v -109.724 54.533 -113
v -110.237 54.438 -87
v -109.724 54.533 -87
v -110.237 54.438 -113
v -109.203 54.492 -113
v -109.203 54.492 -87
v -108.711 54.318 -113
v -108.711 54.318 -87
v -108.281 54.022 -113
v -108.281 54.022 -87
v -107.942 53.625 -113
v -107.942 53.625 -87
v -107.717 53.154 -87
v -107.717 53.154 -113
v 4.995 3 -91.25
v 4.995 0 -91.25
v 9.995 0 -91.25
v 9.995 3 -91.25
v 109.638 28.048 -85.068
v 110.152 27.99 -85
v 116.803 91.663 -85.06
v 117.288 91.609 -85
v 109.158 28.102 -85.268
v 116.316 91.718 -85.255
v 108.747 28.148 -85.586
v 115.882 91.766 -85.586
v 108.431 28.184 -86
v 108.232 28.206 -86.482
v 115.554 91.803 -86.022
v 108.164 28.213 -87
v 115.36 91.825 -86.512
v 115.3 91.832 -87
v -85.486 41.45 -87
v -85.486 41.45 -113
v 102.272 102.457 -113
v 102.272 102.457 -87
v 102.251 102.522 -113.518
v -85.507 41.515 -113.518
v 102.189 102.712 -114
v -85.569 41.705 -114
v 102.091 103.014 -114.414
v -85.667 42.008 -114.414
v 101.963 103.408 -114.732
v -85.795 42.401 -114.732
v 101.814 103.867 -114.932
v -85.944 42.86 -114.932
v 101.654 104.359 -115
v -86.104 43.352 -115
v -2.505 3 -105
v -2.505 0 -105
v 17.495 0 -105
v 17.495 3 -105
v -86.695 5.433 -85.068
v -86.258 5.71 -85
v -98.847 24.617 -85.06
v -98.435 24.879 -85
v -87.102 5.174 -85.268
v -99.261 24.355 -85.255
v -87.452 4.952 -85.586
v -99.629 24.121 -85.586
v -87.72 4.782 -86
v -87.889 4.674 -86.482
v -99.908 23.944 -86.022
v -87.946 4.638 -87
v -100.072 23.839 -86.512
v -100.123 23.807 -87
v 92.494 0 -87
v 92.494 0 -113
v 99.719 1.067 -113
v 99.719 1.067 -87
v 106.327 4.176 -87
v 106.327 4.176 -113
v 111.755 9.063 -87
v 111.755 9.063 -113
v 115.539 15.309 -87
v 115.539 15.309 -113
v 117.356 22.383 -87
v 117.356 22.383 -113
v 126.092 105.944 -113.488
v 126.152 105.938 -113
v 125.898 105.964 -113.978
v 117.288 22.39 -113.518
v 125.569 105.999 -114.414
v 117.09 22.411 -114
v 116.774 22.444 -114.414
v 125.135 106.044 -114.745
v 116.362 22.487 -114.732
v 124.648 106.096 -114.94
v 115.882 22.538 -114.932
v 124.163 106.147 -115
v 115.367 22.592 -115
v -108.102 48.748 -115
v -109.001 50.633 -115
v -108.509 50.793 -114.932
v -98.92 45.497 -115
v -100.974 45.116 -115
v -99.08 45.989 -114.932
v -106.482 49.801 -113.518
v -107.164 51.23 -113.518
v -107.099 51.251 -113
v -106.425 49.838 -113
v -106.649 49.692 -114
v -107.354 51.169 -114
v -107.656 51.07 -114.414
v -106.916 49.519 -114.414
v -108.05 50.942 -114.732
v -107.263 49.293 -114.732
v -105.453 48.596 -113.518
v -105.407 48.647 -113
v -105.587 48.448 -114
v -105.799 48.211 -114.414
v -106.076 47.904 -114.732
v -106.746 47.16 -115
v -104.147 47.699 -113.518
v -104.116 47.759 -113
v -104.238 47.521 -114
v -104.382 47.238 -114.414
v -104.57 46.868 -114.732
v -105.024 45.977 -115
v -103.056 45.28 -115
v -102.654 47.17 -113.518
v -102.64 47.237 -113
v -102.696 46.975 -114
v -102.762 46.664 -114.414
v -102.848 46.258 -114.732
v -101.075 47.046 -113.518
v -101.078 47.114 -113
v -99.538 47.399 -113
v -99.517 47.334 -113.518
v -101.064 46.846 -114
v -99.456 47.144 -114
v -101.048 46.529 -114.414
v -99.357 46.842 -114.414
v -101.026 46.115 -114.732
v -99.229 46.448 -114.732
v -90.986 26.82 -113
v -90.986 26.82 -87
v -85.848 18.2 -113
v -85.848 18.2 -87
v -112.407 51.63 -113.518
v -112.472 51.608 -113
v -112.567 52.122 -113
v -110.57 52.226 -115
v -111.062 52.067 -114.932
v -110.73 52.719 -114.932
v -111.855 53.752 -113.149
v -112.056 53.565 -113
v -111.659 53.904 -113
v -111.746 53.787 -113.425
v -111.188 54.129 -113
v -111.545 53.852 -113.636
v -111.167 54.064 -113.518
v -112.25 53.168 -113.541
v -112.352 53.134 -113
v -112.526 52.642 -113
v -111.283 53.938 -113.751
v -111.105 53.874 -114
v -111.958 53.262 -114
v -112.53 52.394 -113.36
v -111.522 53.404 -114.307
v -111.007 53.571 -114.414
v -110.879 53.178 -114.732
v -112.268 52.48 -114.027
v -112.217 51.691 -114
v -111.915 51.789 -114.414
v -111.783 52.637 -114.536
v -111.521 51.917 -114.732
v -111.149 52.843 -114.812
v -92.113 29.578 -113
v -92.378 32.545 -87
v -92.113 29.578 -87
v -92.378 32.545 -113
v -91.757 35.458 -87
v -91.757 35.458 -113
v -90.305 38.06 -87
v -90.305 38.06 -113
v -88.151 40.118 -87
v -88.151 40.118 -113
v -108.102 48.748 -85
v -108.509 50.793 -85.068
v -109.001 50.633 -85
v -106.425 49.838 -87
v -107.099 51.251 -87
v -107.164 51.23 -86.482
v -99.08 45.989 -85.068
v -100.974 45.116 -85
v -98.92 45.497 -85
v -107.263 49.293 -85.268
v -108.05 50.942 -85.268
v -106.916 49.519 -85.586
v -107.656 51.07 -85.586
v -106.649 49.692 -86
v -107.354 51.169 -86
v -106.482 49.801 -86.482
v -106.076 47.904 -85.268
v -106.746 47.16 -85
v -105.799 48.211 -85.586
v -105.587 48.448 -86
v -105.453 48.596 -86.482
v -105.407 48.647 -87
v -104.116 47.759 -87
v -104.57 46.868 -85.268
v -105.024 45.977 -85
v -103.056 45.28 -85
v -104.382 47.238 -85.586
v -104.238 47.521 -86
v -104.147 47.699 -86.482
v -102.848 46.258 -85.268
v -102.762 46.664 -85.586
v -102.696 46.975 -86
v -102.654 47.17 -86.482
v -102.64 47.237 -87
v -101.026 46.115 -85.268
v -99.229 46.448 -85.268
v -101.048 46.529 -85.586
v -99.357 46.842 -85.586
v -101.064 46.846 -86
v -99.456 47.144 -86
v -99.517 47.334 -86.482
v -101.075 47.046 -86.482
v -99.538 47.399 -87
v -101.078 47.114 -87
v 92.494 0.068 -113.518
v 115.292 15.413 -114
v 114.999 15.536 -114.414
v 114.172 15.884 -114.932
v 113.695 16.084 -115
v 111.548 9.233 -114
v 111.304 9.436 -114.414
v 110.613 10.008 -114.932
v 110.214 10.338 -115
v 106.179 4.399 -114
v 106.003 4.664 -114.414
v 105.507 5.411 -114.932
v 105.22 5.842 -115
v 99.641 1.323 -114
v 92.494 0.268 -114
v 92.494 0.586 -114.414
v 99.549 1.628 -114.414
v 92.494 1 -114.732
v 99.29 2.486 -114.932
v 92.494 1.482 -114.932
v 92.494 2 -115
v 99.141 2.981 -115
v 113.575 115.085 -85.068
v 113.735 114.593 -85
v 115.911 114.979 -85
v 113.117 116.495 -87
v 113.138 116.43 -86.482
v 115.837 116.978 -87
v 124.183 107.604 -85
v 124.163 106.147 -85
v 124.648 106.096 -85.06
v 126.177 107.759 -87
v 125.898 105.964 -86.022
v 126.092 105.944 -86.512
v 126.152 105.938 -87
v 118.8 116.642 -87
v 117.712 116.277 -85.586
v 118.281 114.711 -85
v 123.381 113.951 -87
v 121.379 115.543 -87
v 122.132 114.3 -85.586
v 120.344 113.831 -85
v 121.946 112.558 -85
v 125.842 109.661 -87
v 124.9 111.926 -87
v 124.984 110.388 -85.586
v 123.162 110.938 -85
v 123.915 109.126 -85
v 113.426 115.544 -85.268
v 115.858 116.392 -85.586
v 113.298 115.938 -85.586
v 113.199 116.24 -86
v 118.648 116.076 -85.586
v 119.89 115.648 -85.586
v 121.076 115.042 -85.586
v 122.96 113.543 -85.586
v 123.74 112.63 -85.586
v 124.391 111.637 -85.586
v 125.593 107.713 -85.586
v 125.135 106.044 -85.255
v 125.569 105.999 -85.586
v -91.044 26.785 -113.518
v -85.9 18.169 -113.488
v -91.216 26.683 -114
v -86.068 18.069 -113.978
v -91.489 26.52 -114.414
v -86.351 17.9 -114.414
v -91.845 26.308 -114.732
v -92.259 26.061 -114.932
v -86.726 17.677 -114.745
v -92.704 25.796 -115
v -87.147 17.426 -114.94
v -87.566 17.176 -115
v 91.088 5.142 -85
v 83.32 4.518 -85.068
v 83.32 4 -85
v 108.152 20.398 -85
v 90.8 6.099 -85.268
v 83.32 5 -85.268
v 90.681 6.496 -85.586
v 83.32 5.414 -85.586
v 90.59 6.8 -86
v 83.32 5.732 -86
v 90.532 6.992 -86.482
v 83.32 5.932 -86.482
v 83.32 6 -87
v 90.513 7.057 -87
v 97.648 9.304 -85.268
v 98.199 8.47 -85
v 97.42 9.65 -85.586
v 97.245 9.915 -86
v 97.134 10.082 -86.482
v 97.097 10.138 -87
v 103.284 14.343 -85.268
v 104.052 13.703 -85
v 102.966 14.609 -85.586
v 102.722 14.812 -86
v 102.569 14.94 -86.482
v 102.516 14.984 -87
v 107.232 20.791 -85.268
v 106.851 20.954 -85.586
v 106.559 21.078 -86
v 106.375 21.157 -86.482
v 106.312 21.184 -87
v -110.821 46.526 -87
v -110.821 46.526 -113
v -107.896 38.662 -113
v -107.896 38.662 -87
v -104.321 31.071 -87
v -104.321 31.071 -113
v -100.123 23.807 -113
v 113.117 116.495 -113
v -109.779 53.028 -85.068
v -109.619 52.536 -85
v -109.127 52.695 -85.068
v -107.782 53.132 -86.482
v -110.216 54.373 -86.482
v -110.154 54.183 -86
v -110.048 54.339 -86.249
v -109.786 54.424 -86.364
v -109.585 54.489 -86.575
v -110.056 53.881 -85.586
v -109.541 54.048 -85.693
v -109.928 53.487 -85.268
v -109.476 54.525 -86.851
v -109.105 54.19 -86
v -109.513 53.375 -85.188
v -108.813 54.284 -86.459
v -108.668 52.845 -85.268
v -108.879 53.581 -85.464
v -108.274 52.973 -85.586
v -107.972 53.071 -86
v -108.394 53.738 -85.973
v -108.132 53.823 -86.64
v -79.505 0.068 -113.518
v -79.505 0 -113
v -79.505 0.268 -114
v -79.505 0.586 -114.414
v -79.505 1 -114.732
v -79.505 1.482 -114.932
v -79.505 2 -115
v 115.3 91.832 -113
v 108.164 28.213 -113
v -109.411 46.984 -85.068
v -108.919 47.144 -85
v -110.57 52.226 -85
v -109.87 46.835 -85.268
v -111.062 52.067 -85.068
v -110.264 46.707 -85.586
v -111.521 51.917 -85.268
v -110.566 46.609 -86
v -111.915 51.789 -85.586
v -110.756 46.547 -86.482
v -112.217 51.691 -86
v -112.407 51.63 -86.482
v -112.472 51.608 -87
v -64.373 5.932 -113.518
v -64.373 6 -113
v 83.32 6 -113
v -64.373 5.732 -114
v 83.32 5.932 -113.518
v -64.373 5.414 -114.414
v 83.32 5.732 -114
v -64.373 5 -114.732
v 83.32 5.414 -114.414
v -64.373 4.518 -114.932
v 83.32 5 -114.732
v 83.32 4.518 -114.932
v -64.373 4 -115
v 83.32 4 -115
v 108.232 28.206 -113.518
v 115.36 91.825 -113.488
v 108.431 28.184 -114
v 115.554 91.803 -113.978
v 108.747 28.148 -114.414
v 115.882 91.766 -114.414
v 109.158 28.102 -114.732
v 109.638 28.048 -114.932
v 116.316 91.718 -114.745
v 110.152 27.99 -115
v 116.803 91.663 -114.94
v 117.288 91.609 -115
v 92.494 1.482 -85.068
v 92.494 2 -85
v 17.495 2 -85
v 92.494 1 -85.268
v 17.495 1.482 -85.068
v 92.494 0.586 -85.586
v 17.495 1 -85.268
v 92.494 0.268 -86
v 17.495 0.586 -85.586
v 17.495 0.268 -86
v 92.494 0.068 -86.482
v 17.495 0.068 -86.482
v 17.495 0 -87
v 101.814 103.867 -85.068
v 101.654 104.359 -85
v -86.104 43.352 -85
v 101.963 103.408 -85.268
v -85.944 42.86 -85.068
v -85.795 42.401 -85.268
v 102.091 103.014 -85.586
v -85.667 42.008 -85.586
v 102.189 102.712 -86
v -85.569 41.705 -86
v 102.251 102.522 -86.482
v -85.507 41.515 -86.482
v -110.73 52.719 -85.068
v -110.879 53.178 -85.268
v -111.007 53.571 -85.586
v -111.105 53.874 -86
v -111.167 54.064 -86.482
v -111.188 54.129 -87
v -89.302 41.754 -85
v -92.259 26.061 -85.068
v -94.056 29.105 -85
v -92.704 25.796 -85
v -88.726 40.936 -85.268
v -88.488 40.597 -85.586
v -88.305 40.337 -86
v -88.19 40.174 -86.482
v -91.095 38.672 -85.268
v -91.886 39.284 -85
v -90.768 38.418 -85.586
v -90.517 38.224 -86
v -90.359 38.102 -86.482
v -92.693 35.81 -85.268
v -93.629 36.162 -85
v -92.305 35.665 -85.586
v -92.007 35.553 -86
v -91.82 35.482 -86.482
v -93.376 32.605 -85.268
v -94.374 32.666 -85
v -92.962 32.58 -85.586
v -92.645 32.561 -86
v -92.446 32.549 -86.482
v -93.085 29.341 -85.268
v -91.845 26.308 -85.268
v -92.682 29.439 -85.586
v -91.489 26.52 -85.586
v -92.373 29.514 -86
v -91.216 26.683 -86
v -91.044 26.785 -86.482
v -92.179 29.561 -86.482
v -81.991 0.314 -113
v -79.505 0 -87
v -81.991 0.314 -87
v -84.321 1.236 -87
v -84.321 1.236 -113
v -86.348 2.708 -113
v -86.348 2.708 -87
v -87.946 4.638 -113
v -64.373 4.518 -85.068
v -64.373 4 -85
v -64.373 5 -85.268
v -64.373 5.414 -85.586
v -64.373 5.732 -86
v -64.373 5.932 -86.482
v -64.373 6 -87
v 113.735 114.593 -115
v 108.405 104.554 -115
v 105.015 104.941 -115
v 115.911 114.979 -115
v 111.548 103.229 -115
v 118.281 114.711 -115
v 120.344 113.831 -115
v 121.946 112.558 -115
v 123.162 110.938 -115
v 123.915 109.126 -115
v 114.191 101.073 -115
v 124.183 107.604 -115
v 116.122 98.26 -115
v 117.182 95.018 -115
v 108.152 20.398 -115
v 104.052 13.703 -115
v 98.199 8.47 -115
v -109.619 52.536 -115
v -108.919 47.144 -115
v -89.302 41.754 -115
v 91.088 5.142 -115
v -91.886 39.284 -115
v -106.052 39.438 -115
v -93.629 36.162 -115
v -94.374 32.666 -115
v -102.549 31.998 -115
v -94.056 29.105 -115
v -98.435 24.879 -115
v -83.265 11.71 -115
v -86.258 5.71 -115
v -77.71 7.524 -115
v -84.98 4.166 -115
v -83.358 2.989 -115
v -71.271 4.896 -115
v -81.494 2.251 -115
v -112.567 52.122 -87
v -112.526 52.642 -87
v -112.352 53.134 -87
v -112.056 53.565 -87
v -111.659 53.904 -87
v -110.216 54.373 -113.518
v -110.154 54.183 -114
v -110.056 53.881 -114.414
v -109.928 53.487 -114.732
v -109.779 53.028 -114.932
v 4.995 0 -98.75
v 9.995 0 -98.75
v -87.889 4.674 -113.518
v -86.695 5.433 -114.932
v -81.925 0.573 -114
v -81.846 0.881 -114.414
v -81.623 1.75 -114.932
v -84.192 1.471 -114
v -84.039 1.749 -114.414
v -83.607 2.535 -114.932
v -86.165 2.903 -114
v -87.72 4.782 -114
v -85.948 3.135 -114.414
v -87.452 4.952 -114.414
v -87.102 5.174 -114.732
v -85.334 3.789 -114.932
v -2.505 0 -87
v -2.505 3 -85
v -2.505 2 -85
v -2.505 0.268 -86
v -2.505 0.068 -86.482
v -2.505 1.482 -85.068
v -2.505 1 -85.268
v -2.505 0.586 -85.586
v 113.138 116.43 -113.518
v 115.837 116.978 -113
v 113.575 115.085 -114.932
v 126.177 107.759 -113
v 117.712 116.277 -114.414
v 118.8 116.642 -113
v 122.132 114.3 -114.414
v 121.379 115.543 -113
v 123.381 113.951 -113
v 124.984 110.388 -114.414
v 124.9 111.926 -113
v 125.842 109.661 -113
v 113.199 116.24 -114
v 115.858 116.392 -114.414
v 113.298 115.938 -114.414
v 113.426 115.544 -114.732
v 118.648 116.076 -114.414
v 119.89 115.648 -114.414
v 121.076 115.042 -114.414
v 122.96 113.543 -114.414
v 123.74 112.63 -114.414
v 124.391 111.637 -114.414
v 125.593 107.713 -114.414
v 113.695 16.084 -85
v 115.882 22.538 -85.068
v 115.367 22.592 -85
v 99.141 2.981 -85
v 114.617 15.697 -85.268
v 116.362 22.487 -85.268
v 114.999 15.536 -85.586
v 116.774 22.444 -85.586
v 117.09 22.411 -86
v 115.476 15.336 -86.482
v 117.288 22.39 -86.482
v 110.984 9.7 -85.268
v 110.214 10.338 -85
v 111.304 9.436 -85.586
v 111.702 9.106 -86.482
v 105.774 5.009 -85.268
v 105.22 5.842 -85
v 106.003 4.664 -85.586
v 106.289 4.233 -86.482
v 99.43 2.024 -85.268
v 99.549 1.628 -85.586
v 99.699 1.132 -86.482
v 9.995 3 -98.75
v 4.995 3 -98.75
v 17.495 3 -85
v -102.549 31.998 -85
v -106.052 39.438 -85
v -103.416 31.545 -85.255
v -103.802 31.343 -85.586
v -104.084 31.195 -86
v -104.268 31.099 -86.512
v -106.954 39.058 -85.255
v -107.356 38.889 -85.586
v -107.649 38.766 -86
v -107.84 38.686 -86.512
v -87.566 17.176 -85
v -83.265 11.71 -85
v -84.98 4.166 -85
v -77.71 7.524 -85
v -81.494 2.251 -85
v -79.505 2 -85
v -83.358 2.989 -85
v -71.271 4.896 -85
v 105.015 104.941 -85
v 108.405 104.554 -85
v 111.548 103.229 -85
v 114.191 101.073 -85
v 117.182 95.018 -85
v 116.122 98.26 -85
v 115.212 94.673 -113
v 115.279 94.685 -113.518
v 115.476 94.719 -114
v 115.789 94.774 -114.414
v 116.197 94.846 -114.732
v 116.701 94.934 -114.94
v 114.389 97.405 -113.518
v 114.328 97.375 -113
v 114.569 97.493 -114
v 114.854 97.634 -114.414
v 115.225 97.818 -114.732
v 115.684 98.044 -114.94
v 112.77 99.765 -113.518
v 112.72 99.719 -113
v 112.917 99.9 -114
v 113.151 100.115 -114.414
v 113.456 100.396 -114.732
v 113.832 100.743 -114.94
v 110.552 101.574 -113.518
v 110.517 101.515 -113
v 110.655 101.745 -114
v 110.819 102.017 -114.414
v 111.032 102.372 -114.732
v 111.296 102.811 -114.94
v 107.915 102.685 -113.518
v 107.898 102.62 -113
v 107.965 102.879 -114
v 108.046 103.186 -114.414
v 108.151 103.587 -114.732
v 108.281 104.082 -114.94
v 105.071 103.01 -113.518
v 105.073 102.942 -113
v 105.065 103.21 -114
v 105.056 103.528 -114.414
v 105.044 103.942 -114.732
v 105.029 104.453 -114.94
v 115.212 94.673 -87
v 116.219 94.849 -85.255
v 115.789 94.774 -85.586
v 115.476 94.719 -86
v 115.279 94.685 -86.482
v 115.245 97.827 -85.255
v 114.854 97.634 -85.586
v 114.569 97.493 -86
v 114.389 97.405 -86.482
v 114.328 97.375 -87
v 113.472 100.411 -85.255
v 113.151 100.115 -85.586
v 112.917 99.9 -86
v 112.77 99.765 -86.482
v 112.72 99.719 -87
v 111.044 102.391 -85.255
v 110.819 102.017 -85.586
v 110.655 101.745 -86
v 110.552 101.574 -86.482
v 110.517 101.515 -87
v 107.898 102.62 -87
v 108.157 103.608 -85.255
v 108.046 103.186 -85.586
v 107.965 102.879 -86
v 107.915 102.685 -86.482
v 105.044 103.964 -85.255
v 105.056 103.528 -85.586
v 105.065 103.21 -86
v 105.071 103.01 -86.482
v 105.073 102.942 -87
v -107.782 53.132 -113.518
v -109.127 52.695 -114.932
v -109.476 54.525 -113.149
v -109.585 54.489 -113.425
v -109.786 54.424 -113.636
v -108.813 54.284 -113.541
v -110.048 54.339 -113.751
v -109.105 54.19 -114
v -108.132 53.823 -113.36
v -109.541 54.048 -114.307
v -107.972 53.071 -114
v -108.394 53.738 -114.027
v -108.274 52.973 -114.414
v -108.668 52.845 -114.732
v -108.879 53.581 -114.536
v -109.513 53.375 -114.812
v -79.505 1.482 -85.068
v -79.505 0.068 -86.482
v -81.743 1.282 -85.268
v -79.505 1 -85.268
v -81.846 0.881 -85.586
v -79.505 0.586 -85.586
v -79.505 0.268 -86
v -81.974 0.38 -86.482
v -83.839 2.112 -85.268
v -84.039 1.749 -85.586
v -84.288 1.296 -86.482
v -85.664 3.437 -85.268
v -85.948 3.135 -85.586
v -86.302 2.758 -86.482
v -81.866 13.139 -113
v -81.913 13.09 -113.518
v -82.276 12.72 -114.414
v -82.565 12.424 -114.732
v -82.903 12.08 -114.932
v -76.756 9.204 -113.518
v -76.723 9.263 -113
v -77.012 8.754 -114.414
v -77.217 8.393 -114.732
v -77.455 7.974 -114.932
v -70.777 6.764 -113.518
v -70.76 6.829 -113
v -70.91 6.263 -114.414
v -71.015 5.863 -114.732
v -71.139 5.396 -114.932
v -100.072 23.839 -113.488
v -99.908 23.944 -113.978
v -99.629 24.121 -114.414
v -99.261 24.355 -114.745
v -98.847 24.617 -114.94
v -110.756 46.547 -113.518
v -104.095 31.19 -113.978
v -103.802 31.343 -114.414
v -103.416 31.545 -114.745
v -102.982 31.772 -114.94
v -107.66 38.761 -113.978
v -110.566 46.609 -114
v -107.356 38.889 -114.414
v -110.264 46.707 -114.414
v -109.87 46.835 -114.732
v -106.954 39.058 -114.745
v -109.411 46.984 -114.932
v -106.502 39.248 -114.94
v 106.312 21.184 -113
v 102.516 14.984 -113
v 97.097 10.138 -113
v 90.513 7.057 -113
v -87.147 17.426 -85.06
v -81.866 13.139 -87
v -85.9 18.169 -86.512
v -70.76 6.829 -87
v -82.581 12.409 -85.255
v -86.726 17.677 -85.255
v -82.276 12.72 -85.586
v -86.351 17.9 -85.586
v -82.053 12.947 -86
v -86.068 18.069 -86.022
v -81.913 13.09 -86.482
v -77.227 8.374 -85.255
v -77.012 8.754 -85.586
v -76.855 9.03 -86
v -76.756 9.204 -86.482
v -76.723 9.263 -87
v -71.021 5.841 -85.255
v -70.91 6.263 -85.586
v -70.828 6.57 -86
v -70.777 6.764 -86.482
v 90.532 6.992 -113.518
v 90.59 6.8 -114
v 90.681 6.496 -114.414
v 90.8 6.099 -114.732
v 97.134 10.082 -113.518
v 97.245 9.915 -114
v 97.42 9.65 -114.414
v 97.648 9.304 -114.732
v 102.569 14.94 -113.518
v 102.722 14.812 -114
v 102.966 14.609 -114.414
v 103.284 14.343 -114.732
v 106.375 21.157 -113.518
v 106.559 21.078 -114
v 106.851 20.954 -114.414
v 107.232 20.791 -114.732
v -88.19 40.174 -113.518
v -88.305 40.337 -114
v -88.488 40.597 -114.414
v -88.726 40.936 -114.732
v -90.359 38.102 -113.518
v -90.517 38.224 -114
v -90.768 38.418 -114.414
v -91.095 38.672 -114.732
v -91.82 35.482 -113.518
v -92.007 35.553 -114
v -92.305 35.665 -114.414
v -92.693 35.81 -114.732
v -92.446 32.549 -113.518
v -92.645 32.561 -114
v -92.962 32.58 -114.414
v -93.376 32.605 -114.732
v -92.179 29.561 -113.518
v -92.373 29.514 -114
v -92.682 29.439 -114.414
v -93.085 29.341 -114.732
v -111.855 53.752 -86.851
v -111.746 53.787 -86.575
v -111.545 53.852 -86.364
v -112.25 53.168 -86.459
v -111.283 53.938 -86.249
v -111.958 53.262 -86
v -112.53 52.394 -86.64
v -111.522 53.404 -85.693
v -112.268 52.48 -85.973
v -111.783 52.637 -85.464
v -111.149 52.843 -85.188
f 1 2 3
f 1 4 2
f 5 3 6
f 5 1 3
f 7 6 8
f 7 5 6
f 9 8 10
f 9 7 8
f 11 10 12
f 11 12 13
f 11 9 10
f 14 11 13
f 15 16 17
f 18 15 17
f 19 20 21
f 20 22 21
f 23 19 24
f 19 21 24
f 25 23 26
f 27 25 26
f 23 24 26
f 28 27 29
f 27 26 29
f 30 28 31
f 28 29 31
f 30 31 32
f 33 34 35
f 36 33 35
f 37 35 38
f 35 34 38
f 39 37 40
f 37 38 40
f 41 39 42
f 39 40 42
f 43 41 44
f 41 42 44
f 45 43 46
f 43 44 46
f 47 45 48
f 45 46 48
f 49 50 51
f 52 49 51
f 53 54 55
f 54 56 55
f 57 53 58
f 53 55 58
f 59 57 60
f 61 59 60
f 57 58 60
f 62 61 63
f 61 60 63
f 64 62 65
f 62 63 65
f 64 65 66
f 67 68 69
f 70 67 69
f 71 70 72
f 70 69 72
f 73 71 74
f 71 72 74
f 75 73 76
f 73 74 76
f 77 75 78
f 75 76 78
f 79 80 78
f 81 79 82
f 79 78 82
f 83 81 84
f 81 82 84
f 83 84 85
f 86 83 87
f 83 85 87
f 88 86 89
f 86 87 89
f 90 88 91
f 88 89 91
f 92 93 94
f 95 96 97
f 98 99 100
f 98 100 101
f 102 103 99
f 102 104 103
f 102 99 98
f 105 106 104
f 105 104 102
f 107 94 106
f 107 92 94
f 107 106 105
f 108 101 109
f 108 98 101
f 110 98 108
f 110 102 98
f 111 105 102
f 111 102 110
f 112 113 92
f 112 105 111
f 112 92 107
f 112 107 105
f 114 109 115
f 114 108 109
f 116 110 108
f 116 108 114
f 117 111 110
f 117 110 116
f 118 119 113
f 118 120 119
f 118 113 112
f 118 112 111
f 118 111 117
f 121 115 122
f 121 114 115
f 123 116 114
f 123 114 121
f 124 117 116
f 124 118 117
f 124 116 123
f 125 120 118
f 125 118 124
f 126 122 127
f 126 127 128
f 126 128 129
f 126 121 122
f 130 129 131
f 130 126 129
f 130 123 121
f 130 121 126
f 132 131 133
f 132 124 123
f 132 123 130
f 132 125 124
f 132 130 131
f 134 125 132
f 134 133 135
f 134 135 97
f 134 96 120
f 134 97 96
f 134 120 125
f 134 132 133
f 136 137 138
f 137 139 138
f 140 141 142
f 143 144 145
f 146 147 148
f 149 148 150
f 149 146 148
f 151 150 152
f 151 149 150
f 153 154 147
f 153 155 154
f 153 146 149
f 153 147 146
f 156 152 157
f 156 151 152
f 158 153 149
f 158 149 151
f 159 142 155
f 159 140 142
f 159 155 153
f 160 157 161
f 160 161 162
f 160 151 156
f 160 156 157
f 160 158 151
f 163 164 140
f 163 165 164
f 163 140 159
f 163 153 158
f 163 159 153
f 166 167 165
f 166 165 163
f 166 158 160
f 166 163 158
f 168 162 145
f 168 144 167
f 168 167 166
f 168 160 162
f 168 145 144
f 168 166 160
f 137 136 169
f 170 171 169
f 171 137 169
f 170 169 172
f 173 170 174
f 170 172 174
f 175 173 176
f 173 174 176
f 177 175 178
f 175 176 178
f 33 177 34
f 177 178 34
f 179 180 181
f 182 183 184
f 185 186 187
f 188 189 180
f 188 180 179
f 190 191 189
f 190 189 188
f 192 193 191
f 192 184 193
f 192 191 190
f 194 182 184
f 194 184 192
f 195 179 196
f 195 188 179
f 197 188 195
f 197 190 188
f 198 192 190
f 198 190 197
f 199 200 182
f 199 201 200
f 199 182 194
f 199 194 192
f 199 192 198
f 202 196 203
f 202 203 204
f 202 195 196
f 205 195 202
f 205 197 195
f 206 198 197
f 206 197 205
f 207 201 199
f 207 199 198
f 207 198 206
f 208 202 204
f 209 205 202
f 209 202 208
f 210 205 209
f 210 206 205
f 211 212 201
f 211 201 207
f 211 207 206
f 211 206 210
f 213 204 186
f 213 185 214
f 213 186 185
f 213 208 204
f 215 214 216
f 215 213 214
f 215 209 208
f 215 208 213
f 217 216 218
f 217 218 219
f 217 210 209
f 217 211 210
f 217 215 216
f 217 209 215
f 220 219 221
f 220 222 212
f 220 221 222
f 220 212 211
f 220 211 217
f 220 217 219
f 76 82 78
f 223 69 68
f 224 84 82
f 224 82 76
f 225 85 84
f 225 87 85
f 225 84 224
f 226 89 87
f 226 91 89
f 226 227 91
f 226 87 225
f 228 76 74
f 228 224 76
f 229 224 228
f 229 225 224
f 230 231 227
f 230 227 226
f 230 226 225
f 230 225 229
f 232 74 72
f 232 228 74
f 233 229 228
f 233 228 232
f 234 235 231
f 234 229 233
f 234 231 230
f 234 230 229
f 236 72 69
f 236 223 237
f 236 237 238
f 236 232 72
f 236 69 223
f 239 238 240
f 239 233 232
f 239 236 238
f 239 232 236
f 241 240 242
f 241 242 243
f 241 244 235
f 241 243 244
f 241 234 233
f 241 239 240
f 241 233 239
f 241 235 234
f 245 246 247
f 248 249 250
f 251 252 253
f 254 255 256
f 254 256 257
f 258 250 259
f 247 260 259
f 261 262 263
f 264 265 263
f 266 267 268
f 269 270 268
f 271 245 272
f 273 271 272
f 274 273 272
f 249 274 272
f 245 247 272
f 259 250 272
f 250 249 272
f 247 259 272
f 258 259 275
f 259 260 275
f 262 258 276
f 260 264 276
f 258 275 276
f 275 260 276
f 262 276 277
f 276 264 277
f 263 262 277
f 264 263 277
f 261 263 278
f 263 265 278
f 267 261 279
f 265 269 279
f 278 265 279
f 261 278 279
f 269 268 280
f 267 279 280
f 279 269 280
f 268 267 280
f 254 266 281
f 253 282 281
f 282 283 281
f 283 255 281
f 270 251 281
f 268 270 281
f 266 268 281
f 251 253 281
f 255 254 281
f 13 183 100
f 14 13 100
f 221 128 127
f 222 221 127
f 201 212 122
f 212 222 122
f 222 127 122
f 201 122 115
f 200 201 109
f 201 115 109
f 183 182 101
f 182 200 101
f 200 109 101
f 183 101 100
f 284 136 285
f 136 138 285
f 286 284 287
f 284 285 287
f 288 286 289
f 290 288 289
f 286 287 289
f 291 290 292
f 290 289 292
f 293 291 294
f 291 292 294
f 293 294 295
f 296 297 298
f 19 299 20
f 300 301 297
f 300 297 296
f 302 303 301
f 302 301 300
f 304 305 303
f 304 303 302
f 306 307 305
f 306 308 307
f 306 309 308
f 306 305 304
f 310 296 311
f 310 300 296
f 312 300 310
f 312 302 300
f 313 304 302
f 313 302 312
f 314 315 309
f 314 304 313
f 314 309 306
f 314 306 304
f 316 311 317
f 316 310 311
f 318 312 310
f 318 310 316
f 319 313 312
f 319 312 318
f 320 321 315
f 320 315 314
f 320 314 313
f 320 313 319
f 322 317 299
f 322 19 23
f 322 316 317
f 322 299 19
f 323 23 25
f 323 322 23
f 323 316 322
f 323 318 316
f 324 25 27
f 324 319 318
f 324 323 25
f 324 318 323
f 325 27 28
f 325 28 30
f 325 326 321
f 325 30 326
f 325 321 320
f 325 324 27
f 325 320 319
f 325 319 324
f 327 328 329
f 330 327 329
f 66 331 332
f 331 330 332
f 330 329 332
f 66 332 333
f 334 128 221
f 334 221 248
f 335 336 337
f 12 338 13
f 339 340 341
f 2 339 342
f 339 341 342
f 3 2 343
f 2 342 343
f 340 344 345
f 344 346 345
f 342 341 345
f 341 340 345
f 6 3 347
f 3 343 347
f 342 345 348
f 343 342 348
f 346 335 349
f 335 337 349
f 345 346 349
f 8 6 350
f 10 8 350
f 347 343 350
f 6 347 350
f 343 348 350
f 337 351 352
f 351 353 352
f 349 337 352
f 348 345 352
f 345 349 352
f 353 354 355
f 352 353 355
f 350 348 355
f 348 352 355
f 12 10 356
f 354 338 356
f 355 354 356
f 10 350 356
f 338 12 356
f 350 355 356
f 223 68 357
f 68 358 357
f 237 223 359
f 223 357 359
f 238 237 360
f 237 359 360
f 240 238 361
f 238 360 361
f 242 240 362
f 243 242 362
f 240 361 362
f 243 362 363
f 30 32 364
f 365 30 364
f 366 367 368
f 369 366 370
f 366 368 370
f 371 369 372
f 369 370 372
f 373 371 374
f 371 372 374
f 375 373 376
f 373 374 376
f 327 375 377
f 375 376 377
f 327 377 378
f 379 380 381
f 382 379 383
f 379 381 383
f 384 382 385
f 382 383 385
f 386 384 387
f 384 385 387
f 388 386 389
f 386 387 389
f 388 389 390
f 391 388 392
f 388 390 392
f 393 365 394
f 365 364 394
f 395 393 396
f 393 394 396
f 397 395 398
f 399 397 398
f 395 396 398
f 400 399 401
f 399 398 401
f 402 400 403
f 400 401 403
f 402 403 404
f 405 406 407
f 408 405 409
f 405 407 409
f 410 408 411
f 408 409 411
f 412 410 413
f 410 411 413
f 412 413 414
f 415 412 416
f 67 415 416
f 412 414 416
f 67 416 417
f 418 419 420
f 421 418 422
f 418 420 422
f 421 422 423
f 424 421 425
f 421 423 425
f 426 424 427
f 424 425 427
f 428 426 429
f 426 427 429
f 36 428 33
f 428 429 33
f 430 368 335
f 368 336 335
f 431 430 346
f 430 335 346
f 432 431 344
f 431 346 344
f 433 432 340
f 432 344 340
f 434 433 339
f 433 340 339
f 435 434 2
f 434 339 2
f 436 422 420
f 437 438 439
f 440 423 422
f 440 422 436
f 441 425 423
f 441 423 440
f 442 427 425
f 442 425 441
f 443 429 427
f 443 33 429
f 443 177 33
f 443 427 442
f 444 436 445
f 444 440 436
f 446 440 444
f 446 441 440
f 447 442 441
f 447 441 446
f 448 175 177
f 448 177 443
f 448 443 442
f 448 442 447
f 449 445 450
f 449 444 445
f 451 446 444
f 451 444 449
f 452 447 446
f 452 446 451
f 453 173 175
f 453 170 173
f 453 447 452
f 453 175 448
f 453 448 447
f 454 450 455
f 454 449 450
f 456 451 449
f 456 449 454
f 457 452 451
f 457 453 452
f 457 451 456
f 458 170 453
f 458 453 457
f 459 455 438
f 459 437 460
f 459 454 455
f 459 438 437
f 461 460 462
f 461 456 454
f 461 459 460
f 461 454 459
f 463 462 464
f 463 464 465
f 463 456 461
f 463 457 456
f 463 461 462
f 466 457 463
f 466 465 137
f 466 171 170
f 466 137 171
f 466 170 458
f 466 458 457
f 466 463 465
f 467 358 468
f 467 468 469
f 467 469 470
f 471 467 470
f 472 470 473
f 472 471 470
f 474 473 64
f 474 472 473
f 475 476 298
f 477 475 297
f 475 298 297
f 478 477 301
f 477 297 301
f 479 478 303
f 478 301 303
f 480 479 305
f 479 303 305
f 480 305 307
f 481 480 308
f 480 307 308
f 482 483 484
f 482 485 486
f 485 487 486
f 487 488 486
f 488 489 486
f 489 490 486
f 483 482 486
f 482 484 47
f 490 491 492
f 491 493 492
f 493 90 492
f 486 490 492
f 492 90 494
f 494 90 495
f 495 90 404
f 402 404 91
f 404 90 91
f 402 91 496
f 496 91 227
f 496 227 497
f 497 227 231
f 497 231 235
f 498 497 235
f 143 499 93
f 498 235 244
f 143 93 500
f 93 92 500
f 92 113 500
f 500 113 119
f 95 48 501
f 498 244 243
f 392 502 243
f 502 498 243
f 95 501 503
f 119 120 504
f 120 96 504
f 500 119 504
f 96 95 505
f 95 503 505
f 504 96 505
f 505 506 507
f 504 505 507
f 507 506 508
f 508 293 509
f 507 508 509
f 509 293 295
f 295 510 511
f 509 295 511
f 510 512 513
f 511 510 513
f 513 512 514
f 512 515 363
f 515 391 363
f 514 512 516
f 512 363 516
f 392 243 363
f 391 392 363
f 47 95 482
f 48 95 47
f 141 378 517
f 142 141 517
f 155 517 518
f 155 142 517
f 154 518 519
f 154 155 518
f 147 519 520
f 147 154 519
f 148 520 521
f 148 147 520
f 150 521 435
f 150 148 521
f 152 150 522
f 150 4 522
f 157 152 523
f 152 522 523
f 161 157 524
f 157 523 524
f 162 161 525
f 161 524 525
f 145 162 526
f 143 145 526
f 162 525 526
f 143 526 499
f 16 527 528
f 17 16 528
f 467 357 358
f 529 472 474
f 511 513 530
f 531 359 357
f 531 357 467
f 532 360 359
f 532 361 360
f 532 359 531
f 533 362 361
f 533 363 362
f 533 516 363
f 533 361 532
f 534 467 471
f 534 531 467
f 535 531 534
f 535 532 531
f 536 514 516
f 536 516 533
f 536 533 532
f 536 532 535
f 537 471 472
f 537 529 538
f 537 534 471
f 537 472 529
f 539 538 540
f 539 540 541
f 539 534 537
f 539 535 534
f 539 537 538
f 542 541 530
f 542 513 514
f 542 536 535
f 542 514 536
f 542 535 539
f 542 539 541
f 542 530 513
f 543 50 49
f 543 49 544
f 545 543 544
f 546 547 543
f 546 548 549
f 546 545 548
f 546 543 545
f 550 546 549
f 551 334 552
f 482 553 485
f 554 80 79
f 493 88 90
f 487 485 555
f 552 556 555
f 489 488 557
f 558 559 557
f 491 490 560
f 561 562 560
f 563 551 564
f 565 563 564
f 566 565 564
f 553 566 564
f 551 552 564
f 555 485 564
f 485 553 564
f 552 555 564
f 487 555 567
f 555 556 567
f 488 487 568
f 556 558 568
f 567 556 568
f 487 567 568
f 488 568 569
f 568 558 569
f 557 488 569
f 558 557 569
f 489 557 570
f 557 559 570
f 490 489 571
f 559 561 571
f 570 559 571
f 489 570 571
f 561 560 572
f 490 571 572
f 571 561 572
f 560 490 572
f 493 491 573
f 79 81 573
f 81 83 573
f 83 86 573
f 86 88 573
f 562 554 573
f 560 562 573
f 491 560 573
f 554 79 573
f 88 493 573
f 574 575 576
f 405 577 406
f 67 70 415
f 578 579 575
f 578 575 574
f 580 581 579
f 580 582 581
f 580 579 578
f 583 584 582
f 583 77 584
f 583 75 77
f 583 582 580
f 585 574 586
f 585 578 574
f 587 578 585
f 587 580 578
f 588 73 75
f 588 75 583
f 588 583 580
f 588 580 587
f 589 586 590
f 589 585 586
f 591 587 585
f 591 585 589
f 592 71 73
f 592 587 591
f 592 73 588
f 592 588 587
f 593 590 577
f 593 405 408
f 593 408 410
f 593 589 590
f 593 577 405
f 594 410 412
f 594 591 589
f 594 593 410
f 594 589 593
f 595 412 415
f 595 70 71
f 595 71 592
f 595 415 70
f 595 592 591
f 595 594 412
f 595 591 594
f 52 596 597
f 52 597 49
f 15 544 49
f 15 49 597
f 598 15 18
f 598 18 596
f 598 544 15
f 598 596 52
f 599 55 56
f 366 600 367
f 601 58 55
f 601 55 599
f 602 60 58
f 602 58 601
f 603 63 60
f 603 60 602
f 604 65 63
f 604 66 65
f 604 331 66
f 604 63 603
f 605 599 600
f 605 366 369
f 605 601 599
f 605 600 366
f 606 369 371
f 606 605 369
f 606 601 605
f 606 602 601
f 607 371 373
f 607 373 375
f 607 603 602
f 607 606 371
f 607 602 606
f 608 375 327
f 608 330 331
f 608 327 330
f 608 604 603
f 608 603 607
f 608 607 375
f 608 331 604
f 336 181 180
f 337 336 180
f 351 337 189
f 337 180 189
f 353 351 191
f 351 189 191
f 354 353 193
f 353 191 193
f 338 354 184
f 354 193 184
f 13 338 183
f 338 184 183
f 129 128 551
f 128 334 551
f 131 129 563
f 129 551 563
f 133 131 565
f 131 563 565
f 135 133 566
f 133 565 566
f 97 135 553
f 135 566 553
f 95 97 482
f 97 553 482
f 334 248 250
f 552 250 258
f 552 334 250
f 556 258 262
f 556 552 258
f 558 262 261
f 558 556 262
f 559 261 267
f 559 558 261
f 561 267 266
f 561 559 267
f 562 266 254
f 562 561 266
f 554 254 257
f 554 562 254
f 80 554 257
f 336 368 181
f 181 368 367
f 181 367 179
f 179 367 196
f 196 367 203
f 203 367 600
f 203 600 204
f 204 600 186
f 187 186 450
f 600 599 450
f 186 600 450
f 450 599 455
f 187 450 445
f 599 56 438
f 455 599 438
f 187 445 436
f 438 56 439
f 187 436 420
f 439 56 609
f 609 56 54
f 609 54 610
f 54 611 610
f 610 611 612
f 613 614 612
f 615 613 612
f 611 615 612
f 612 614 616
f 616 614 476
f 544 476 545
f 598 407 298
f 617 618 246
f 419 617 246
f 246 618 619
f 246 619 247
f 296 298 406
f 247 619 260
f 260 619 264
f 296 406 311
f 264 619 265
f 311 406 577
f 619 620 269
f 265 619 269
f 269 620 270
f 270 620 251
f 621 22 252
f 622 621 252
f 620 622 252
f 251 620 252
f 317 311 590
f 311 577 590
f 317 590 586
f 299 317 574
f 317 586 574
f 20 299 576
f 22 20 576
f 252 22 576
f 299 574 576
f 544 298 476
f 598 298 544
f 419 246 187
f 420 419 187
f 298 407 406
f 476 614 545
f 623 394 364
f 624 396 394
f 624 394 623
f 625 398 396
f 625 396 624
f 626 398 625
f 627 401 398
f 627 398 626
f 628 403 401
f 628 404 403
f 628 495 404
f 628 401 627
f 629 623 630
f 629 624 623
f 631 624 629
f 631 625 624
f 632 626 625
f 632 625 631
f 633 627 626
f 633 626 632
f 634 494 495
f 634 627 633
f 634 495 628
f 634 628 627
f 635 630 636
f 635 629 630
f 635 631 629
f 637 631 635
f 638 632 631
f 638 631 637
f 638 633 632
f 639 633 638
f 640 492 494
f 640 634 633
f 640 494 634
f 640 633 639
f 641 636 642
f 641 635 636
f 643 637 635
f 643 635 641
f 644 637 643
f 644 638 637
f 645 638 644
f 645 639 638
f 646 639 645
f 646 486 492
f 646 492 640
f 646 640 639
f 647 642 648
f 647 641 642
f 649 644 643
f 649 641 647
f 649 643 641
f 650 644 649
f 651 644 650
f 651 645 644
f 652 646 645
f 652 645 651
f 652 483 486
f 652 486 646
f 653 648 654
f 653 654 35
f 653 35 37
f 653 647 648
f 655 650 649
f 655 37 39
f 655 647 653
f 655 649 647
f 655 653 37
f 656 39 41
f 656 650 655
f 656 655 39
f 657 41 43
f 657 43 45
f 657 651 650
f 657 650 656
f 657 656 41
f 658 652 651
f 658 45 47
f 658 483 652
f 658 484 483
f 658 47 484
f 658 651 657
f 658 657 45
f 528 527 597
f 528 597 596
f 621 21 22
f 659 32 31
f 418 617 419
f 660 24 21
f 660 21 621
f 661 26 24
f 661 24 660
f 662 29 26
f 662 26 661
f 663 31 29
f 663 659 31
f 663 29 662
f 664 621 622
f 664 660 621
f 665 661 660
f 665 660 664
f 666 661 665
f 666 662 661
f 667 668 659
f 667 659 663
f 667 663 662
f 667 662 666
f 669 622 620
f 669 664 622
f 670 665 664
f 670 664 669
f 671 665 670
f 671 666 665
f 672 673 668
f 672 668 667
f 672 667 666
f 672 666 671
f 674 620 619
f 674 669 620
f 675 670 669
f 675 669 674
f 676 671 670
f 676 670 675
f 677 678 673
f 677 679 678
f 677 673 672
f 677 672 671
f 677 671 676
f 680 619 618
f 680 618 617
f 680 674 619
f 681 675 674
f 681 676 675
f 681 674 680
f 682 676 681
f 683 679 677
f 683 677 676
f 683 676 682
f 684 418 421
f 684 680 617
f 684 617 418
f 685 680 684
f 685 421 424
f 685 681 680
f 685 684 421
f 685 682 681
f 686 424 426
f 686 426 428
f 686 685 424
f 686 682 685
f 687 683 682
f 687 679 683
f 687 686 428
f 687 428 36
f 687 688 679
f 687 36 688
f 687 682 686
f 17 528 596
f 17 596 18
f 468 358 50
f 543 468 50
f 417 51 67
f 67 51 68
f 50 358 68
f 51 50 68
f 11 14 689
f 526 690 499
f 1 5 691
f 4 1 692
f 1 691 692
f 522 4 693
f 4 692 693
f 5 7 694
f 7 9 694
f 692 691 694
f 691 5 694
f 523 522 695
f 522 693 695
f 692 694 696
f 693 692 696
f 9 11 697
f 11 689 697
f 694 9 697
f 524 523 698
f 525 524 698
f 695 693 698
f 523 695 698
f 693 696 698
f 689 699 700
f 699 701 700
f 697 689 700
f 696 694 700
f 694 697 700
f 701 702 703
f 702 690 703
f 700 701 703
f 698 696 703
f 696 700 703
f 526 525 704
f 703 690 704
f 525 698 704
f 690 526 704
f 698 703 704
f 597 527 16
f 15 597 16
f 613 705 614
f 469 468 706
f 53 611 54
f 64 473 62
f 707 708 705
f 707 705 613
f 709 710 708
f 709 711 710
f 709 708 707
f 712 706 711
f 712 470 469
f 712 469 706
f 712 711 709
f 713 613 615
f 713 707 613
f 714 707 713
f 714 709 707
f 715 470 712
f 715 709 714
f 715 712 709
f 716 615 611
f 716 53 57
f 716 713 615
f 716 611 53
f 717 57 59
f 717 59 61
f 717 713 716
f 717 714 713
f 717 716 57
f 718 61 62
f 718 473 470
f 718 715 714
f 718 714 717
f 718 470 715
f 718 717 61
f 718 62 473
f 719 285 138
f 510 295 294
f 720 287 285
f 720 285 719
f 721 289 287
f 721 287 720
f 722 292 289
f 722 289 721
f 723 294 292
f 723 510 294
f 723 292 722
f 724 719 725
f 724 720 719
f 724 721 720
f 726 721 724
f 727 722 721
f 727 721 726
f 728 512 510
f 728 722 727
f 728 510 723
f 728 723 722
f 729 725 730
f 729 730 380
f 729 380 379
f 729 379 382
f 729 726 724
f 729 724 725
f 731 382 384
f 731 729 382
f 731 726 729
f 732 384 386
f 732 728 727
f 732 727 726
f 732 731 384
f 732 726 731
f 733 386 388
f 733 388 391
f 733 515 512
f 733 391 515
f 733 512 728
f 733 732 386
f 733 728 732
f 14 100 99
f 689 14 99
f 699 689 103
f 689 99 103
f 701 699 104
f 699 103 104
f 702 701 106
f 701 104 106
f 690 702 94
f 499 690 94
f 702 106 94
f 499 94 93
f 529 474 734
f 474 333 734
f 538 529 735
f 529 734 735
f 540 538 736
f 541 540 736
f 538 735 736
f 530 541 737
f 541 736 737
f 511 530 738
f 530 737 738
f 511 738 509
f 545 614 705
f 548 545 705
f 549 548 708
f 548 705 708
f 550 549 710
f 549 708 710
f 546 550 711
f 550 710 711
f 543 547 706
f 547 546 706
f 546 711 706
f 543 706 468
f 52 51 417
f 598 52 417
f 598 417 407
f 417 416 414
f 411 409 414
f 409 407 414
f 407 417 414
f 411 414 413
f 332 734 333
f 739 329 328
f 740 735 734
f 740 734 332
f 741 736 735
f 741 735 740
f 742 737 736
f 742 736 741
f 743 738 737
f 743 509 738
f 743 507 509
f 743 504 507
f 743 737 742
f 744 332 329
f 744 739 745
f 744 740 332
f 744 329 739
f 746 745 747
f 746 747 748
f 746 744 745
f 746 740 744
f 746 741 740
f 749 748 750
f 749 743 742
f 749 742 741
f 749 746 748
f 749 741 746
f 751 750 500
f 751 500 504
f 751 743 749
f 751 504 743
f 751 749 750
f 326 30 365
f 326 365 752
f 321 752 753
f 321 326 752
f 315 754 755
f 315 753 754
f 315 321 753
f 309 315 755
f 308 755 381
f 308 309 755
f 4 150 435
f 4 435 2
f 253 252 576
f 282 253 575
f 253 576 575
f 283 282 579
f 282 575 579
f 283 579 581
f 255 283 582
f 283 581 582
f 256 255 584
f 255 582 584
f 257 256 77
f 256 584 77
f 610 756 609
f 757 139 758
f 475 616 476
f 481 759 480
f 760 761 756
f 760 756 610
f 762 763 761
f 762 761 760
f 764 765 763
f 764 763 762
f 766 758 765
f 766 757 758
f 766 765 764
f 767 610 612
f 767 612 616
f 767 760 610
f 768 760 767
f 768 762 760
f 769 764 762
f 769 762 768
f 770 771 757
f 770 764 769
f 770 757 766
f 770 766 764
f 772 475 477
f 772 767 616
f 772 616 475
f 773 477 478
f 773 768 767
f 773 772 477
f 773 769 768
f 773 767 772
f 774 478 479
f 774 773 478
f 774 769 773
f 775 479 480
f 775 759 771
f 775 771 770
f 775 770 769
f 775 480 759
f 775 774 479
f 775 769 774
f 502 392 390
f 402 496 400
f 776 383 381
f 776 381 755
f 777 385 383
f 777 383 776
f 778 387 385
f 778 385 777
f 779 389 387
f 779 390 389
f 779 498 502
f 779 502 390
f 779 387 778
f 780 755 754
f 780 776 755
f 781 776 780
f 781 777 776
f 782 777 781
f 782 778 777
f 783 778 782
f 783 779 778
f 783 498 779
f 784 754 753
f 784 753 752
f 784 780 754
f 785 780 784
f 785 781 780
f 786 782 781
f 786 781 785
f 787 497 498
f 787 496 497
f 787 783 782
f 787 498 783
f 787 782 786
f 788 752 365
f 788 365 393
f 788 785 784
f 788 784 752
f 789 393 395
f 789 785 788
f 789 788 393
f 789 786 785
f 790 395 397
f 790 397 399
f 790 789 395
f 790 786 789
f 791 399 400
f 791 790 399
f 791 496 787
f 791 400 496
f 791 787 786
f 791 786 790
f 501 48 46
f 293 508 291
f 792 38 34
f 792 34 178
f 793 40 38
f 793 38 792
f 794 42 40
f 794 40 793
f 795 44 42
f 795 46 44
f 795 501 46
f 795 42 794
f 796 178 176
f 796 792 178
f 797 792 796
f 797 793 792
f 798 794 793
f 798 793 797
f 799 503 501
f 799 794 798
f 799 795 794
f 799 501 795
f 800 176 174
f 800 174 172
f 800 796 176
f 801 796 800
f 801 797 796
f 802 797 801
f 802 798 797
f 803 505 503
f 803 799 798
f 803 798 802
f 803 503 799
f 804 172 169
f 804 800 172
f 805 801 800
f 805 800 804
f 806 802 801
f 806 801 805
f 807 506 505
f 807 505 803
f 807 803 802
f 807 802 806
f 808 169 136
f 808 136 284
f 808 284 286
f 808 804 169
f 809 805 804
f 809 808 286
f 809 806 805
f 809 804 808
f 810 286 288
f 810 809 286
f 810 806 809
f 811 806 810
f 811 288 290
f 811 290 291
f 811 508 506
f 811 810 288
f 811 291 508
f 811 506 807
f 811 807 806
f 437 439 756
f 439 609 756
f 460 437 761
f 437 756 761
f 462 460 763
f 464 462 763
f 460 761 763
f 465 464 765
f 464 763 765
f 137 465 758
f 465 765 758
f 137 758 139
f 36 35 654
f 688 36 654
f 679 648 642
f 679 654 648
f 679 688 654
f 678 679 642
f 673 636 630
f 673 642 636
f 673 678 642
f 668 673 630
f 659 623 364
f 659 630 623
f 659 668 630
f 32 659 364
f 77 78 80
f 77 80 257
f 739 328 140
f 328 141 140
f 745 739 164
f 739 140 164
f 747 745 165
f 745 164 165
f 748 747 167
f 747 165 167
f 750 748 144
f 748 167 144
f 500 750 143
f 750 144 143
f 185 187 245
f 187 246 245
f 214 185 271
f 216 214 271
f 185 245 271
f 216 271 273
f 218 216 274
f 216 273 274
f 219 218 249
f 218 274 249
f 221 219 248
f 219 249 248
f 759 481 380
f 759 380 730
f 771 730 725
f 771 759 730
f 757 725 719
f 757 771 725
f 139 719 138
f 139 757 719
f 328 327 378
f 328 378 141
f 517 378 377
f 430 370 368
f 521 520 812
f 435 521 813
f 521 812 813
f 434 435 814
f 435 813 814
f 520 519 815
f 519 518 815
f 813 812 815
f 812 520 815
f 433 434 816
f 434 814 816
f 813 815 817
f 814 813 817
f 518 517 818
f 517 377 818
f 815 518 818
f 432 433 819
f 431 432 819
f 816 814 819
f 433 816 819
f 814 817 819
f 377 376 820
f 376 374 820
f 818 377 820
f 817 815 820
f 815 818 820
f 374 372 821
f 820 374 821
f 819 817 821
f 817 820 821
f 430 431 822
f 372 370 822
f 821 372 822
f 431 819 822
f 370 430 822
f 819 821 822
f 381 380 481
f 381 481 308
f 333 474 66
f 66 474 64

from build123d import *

# Parameters (mm, degrees)
SKETCH2_W           = 250
SKETCH2_H           = 30
BOSS_EXTRUDE1_DEPTH = 10
SKETCH3_W           = 5
SKETCH3_H           = 30
BOSS_EXTRUDE2_DEPTH = 10
SKETCH4_W           = 200
SKETCH4_H           = 30
BOSS_EXTRUDE3_DEPTH = 6
SKETCH11_W          = 30
SKETCH11_H          = 55
CUT_EXTRUDE2_DEPTH  = 10
FILLET1_R           = 25
FILLET9_R           = 10
FILLET8_R           = 10
FILLET11_R          = 25
FILLET5_R           = 6
FILLET10_R          = 100
FILLET6_R           = 2
SKETCH12_W          = 20
SKETCH12_H          = 20
SKETCH12_W_2        = 5
SKETCH12_H_2        = 7.5
CUT_EXTRUDE3_DEPTH  = 3


with BuildPart() as part:
    # Sketch2 → Boss-Extrude1 (new body)
    with BuildSketch(Plane(origin=(-23.43534086, 72.126562752, 0), x_dir=(0.9510565162951534, 0.3090169943749482, 0), z_dir=(-0.3090169943749481, 0.9510565162951533, 0))):
        with Locations((33.98053096, 100)):
            Rectangle(SKETCH2_W, SKETCH2_H)
    extrude(amount=-BOSS_EXTRUDE1_DEPTH)

    # Sketch3 → Boss-Extrude2 (add)
    with BuildSketch(Plane(origin=(-23.43534086, 72.126562752, 0), x_dir=(0.9510565162951534, 0.3090169943749482, 0), z_dir=(-0.3090169943749481, 0.9510565162951533, 0))):
        with Locations((-88.51946904, 100)):
            Rectangle(SKETCH3_W, SKETCH3_H)
    extrude(amount=BOSS_EXTRUDE2_DEPTH)



with BuildPart() as body_2:
    # Sketch4 → Boss-Extrude3 (new body)
    with BuildSketch(Plane(origin=(0, 0, 0), x_dir=(1, 0, 0), z_dir=(0, 1, 0))):
        with Locations((15, 100)):
            Rectangle(SKETCH4_W, SKETCH4_H)
    extrude(amount=BOSS_EXTRUDE3_DEPTH)


with BuildPart() as part_1:
    add(part.part)

    add(body_2.part)  # Loft1 merges body 2
    # Sketch6 → Loft1 section 0
    with BuildSketch(Plane(origin=(-23.43534086, 72.126562752, 0), x_dir=(0.9510565162951534, 0.3090169943749482, 0), z_dir=(0.3090169943749481, -0.9510565162951533, 0))):
        with BuildLine():
            Line((158.98053096, -85), (148.98053096, -85))
            Line((148.98053096, -85), (148.98053096, -115))
            Line((148.98053096, -115), (158.98053096, -115))
            Line((158.98053096, -115), (158.98053096, -85))
        make_face()
    # Sketch5 → Loft1 section 1
    with BuildSketch(Plane(origin=(0, 0, 0), x_dir=(1, 0, 0), z_dir=(0, 1, 0))):
        with BuildLine():
            Line((115, 115), (105, 115))
            Line((105, 115), (105, 85))
            Line((105, 85), (115, 85))
            Line((115, 85), (115, 115))
        make_face()
    loft()

    # Sketch11 → Cut-Extrude2 (cut)
    with BuildSketch(Plane(origin=(113.739623688, -11.973083454, 0), x_dir=(0, 0, -1), z_dir=(0.9945050055104876, -0.1046890348345292, 0))):
        with Locations((100, 135.5)):
            Rectangle(SKETCH11_W, SKETCH11_H)
    extrude(amount=CUT_EXTRUDE2_DEPTH, mode=Mode.SUBTRACT)

    # Sketch9 → Loft2 section 0
    with BuildSketch(Plane(origin=(-20.345170916, 62.615997589, 0), x_dir=(0.9510565162951534, 0.3090169943749482, 0), z_dir=(0.3090169943749481, -0.9510565162951533, 0))):
        with BuildLine():
            Line((-91.01946904, -85), (-81.01946904, -85))
            Line((-81.01946904, -85), (-81.01946904, -115))
            Line((-81.01946904, -115), (-91.01946904, -115))
            Line((-91.01946904, -115), (-91.01946904, -85))
        make_face()
    # Sketch10 → Loft2 section 1
    with BuildSketch(Plane(origin=(0, 0, 0), x_dir=(1, 0, 0), z_dir=(0, 1, 0))):
        with BuildLine():
            Line((-85, 115), (-75, 115))
            Line((-75, 115), (-75, 85))
            Line((-75, 85), (-85, 85))
            Line((-85, 85), (-85, 115))
        make_face()
    loft()

    # Fillet1
    fillet1_edges = [part_1.edges().sort_by_distance(p)[0] for p in [
        (105.672974261, 6, -100),
        (-78.576290654, 6, -100),
    ]]
    fillet(fillet1_edges, radius=FILLET1_R)

    # Fillet9
    fillet9_edges = [part_1.edges().sort_by_distance(p)[0] for p in [
        (127.764129074, 121.254248594, -100),
    ]]
    fillet(fillet9_edges, radius=FILLET9_R)

    # Fillet8
    fillet8_edges = [part_1.edges().sort_by_distance(p)[0] for p in [
        (117.029613529, 107.251770821, -100),
        (-97.399264893, 37.579604781, -100),
        (-85, 0, -100),
    ]]
    fillet(fillet8_edges, radius=FILLET8_R)

    # Fillet11
    fillet11_edges = [part_1.edges().sort_by_distance(p)[0] for p in [
        (115, 0, -100),
    ]]
    fillet(fillet11_edges, radius=FILLET11_R)

    # Fillet5
    fillet5_edges = [part_1.edges().sort_by_distance(p)[0] for p in [
        (-105.244717419, 45.545084972, -100),
    ]]
    fillet(fillet5_edges, radius=FILLET5_R)

    # Fillet10
    fillet10_edges = [part_1.edges().sort_by_distance(p)[0] for p in [
        (-106.909830056, 34.489434837, -100),
    ]]
    fillet(fillet10_edges, radius=FILLET10_R)

    # Fillet6
    fillet6_edges = [part_1.edges().sort_by_distance(p)[0] for p in [
        (9.473412371, 6, -115),
        (9.473412371, 6, -85),
        (-76.722563068, 9.262951119, -85),
        (-76.722563068, 9.262951119, -115),
        (99.983633439, 12.363146047, -85),
        (99.983633439, 12.363146047, -115),
        (121.753976282, 64.160140842, -85),
        (121.753976282, 64.160140842, -115),
        (6.789088019, 81.947075002, -85),
        (122.500555572, 114.755349451, -85),
        (122.500555572, 114.755349451, -115),
        (6.494058609, 0, -85),
        (-88.417020392, 22.509949594, -85),
        (8.392983609, 71.953590028, -85),
        (111.732266775, 60.02250459, -85),
        (-84.320965292, 1.235829976, -85),
        (8.392983609, 71.953590028, -115),
        (-88.417020392, 22.509949594, -115),
        (111.732266775, 60.02250459, -115),
        (-84.320965292, 1.235829976, -115),
        (-91.756560464, 35.458482469, -85),
        (-91.756560464, 35.458482469, -115),
        (111.682636246, 100.69569196, -115),
        (111.682636246, 100.69569196, -85),
        (-107.716853374, 53.153537102, -85),
        (-107.716853374, 53.153537102, -115),
        (-113.090169944, 53.510565163, -100),
        (-110.712528653, 54.283107649, -85),
        (-108.334887362, 55.055650135, -100),
        (6.494058609, 0, -115),
        (109.220318345, 6.420028972, -115),
        (-110.712528653, 54.283107649, -115),
        (109.220318345, 6.420028972, -85),
        (6.789088019, 81.947075002, -115),
        (-104.116423285, 47.759486891, -115),
        (-104.116423285, 47.759486891, -85),
        (-111.955491831, 50.018385015, -85),
        (-111.955491831, 50.018385015, -115),
        (-94.034829619, 14.222208325, -85),
        (-106.188112518, 34.829251267, -85),
        (-94.034829619, 14.222208325, -115),
        (-106.188112518, 34.829251267, -115),
    ]]
    fillet(fillet6_edges, radius=FILLET6_R)

    # Sketch12 → Cut-Extrude3 (cut)
    with BuildSketch(Plane.XZ):
        with Locations((7.494564149, -95)):
            Rectangle(SKETCH12_W, SKETCH12_H)
        with Locations((7.494564149, -95)):
            Rectangle(SKETCH12_W_2, SKETCH12_H_2, mode=Mode.SUBTRACT)
    extrude(amount=-CUT_EXTRUDE3_DEPTH, mode=Mode.SUBTRACT)


solid = part_1.part
